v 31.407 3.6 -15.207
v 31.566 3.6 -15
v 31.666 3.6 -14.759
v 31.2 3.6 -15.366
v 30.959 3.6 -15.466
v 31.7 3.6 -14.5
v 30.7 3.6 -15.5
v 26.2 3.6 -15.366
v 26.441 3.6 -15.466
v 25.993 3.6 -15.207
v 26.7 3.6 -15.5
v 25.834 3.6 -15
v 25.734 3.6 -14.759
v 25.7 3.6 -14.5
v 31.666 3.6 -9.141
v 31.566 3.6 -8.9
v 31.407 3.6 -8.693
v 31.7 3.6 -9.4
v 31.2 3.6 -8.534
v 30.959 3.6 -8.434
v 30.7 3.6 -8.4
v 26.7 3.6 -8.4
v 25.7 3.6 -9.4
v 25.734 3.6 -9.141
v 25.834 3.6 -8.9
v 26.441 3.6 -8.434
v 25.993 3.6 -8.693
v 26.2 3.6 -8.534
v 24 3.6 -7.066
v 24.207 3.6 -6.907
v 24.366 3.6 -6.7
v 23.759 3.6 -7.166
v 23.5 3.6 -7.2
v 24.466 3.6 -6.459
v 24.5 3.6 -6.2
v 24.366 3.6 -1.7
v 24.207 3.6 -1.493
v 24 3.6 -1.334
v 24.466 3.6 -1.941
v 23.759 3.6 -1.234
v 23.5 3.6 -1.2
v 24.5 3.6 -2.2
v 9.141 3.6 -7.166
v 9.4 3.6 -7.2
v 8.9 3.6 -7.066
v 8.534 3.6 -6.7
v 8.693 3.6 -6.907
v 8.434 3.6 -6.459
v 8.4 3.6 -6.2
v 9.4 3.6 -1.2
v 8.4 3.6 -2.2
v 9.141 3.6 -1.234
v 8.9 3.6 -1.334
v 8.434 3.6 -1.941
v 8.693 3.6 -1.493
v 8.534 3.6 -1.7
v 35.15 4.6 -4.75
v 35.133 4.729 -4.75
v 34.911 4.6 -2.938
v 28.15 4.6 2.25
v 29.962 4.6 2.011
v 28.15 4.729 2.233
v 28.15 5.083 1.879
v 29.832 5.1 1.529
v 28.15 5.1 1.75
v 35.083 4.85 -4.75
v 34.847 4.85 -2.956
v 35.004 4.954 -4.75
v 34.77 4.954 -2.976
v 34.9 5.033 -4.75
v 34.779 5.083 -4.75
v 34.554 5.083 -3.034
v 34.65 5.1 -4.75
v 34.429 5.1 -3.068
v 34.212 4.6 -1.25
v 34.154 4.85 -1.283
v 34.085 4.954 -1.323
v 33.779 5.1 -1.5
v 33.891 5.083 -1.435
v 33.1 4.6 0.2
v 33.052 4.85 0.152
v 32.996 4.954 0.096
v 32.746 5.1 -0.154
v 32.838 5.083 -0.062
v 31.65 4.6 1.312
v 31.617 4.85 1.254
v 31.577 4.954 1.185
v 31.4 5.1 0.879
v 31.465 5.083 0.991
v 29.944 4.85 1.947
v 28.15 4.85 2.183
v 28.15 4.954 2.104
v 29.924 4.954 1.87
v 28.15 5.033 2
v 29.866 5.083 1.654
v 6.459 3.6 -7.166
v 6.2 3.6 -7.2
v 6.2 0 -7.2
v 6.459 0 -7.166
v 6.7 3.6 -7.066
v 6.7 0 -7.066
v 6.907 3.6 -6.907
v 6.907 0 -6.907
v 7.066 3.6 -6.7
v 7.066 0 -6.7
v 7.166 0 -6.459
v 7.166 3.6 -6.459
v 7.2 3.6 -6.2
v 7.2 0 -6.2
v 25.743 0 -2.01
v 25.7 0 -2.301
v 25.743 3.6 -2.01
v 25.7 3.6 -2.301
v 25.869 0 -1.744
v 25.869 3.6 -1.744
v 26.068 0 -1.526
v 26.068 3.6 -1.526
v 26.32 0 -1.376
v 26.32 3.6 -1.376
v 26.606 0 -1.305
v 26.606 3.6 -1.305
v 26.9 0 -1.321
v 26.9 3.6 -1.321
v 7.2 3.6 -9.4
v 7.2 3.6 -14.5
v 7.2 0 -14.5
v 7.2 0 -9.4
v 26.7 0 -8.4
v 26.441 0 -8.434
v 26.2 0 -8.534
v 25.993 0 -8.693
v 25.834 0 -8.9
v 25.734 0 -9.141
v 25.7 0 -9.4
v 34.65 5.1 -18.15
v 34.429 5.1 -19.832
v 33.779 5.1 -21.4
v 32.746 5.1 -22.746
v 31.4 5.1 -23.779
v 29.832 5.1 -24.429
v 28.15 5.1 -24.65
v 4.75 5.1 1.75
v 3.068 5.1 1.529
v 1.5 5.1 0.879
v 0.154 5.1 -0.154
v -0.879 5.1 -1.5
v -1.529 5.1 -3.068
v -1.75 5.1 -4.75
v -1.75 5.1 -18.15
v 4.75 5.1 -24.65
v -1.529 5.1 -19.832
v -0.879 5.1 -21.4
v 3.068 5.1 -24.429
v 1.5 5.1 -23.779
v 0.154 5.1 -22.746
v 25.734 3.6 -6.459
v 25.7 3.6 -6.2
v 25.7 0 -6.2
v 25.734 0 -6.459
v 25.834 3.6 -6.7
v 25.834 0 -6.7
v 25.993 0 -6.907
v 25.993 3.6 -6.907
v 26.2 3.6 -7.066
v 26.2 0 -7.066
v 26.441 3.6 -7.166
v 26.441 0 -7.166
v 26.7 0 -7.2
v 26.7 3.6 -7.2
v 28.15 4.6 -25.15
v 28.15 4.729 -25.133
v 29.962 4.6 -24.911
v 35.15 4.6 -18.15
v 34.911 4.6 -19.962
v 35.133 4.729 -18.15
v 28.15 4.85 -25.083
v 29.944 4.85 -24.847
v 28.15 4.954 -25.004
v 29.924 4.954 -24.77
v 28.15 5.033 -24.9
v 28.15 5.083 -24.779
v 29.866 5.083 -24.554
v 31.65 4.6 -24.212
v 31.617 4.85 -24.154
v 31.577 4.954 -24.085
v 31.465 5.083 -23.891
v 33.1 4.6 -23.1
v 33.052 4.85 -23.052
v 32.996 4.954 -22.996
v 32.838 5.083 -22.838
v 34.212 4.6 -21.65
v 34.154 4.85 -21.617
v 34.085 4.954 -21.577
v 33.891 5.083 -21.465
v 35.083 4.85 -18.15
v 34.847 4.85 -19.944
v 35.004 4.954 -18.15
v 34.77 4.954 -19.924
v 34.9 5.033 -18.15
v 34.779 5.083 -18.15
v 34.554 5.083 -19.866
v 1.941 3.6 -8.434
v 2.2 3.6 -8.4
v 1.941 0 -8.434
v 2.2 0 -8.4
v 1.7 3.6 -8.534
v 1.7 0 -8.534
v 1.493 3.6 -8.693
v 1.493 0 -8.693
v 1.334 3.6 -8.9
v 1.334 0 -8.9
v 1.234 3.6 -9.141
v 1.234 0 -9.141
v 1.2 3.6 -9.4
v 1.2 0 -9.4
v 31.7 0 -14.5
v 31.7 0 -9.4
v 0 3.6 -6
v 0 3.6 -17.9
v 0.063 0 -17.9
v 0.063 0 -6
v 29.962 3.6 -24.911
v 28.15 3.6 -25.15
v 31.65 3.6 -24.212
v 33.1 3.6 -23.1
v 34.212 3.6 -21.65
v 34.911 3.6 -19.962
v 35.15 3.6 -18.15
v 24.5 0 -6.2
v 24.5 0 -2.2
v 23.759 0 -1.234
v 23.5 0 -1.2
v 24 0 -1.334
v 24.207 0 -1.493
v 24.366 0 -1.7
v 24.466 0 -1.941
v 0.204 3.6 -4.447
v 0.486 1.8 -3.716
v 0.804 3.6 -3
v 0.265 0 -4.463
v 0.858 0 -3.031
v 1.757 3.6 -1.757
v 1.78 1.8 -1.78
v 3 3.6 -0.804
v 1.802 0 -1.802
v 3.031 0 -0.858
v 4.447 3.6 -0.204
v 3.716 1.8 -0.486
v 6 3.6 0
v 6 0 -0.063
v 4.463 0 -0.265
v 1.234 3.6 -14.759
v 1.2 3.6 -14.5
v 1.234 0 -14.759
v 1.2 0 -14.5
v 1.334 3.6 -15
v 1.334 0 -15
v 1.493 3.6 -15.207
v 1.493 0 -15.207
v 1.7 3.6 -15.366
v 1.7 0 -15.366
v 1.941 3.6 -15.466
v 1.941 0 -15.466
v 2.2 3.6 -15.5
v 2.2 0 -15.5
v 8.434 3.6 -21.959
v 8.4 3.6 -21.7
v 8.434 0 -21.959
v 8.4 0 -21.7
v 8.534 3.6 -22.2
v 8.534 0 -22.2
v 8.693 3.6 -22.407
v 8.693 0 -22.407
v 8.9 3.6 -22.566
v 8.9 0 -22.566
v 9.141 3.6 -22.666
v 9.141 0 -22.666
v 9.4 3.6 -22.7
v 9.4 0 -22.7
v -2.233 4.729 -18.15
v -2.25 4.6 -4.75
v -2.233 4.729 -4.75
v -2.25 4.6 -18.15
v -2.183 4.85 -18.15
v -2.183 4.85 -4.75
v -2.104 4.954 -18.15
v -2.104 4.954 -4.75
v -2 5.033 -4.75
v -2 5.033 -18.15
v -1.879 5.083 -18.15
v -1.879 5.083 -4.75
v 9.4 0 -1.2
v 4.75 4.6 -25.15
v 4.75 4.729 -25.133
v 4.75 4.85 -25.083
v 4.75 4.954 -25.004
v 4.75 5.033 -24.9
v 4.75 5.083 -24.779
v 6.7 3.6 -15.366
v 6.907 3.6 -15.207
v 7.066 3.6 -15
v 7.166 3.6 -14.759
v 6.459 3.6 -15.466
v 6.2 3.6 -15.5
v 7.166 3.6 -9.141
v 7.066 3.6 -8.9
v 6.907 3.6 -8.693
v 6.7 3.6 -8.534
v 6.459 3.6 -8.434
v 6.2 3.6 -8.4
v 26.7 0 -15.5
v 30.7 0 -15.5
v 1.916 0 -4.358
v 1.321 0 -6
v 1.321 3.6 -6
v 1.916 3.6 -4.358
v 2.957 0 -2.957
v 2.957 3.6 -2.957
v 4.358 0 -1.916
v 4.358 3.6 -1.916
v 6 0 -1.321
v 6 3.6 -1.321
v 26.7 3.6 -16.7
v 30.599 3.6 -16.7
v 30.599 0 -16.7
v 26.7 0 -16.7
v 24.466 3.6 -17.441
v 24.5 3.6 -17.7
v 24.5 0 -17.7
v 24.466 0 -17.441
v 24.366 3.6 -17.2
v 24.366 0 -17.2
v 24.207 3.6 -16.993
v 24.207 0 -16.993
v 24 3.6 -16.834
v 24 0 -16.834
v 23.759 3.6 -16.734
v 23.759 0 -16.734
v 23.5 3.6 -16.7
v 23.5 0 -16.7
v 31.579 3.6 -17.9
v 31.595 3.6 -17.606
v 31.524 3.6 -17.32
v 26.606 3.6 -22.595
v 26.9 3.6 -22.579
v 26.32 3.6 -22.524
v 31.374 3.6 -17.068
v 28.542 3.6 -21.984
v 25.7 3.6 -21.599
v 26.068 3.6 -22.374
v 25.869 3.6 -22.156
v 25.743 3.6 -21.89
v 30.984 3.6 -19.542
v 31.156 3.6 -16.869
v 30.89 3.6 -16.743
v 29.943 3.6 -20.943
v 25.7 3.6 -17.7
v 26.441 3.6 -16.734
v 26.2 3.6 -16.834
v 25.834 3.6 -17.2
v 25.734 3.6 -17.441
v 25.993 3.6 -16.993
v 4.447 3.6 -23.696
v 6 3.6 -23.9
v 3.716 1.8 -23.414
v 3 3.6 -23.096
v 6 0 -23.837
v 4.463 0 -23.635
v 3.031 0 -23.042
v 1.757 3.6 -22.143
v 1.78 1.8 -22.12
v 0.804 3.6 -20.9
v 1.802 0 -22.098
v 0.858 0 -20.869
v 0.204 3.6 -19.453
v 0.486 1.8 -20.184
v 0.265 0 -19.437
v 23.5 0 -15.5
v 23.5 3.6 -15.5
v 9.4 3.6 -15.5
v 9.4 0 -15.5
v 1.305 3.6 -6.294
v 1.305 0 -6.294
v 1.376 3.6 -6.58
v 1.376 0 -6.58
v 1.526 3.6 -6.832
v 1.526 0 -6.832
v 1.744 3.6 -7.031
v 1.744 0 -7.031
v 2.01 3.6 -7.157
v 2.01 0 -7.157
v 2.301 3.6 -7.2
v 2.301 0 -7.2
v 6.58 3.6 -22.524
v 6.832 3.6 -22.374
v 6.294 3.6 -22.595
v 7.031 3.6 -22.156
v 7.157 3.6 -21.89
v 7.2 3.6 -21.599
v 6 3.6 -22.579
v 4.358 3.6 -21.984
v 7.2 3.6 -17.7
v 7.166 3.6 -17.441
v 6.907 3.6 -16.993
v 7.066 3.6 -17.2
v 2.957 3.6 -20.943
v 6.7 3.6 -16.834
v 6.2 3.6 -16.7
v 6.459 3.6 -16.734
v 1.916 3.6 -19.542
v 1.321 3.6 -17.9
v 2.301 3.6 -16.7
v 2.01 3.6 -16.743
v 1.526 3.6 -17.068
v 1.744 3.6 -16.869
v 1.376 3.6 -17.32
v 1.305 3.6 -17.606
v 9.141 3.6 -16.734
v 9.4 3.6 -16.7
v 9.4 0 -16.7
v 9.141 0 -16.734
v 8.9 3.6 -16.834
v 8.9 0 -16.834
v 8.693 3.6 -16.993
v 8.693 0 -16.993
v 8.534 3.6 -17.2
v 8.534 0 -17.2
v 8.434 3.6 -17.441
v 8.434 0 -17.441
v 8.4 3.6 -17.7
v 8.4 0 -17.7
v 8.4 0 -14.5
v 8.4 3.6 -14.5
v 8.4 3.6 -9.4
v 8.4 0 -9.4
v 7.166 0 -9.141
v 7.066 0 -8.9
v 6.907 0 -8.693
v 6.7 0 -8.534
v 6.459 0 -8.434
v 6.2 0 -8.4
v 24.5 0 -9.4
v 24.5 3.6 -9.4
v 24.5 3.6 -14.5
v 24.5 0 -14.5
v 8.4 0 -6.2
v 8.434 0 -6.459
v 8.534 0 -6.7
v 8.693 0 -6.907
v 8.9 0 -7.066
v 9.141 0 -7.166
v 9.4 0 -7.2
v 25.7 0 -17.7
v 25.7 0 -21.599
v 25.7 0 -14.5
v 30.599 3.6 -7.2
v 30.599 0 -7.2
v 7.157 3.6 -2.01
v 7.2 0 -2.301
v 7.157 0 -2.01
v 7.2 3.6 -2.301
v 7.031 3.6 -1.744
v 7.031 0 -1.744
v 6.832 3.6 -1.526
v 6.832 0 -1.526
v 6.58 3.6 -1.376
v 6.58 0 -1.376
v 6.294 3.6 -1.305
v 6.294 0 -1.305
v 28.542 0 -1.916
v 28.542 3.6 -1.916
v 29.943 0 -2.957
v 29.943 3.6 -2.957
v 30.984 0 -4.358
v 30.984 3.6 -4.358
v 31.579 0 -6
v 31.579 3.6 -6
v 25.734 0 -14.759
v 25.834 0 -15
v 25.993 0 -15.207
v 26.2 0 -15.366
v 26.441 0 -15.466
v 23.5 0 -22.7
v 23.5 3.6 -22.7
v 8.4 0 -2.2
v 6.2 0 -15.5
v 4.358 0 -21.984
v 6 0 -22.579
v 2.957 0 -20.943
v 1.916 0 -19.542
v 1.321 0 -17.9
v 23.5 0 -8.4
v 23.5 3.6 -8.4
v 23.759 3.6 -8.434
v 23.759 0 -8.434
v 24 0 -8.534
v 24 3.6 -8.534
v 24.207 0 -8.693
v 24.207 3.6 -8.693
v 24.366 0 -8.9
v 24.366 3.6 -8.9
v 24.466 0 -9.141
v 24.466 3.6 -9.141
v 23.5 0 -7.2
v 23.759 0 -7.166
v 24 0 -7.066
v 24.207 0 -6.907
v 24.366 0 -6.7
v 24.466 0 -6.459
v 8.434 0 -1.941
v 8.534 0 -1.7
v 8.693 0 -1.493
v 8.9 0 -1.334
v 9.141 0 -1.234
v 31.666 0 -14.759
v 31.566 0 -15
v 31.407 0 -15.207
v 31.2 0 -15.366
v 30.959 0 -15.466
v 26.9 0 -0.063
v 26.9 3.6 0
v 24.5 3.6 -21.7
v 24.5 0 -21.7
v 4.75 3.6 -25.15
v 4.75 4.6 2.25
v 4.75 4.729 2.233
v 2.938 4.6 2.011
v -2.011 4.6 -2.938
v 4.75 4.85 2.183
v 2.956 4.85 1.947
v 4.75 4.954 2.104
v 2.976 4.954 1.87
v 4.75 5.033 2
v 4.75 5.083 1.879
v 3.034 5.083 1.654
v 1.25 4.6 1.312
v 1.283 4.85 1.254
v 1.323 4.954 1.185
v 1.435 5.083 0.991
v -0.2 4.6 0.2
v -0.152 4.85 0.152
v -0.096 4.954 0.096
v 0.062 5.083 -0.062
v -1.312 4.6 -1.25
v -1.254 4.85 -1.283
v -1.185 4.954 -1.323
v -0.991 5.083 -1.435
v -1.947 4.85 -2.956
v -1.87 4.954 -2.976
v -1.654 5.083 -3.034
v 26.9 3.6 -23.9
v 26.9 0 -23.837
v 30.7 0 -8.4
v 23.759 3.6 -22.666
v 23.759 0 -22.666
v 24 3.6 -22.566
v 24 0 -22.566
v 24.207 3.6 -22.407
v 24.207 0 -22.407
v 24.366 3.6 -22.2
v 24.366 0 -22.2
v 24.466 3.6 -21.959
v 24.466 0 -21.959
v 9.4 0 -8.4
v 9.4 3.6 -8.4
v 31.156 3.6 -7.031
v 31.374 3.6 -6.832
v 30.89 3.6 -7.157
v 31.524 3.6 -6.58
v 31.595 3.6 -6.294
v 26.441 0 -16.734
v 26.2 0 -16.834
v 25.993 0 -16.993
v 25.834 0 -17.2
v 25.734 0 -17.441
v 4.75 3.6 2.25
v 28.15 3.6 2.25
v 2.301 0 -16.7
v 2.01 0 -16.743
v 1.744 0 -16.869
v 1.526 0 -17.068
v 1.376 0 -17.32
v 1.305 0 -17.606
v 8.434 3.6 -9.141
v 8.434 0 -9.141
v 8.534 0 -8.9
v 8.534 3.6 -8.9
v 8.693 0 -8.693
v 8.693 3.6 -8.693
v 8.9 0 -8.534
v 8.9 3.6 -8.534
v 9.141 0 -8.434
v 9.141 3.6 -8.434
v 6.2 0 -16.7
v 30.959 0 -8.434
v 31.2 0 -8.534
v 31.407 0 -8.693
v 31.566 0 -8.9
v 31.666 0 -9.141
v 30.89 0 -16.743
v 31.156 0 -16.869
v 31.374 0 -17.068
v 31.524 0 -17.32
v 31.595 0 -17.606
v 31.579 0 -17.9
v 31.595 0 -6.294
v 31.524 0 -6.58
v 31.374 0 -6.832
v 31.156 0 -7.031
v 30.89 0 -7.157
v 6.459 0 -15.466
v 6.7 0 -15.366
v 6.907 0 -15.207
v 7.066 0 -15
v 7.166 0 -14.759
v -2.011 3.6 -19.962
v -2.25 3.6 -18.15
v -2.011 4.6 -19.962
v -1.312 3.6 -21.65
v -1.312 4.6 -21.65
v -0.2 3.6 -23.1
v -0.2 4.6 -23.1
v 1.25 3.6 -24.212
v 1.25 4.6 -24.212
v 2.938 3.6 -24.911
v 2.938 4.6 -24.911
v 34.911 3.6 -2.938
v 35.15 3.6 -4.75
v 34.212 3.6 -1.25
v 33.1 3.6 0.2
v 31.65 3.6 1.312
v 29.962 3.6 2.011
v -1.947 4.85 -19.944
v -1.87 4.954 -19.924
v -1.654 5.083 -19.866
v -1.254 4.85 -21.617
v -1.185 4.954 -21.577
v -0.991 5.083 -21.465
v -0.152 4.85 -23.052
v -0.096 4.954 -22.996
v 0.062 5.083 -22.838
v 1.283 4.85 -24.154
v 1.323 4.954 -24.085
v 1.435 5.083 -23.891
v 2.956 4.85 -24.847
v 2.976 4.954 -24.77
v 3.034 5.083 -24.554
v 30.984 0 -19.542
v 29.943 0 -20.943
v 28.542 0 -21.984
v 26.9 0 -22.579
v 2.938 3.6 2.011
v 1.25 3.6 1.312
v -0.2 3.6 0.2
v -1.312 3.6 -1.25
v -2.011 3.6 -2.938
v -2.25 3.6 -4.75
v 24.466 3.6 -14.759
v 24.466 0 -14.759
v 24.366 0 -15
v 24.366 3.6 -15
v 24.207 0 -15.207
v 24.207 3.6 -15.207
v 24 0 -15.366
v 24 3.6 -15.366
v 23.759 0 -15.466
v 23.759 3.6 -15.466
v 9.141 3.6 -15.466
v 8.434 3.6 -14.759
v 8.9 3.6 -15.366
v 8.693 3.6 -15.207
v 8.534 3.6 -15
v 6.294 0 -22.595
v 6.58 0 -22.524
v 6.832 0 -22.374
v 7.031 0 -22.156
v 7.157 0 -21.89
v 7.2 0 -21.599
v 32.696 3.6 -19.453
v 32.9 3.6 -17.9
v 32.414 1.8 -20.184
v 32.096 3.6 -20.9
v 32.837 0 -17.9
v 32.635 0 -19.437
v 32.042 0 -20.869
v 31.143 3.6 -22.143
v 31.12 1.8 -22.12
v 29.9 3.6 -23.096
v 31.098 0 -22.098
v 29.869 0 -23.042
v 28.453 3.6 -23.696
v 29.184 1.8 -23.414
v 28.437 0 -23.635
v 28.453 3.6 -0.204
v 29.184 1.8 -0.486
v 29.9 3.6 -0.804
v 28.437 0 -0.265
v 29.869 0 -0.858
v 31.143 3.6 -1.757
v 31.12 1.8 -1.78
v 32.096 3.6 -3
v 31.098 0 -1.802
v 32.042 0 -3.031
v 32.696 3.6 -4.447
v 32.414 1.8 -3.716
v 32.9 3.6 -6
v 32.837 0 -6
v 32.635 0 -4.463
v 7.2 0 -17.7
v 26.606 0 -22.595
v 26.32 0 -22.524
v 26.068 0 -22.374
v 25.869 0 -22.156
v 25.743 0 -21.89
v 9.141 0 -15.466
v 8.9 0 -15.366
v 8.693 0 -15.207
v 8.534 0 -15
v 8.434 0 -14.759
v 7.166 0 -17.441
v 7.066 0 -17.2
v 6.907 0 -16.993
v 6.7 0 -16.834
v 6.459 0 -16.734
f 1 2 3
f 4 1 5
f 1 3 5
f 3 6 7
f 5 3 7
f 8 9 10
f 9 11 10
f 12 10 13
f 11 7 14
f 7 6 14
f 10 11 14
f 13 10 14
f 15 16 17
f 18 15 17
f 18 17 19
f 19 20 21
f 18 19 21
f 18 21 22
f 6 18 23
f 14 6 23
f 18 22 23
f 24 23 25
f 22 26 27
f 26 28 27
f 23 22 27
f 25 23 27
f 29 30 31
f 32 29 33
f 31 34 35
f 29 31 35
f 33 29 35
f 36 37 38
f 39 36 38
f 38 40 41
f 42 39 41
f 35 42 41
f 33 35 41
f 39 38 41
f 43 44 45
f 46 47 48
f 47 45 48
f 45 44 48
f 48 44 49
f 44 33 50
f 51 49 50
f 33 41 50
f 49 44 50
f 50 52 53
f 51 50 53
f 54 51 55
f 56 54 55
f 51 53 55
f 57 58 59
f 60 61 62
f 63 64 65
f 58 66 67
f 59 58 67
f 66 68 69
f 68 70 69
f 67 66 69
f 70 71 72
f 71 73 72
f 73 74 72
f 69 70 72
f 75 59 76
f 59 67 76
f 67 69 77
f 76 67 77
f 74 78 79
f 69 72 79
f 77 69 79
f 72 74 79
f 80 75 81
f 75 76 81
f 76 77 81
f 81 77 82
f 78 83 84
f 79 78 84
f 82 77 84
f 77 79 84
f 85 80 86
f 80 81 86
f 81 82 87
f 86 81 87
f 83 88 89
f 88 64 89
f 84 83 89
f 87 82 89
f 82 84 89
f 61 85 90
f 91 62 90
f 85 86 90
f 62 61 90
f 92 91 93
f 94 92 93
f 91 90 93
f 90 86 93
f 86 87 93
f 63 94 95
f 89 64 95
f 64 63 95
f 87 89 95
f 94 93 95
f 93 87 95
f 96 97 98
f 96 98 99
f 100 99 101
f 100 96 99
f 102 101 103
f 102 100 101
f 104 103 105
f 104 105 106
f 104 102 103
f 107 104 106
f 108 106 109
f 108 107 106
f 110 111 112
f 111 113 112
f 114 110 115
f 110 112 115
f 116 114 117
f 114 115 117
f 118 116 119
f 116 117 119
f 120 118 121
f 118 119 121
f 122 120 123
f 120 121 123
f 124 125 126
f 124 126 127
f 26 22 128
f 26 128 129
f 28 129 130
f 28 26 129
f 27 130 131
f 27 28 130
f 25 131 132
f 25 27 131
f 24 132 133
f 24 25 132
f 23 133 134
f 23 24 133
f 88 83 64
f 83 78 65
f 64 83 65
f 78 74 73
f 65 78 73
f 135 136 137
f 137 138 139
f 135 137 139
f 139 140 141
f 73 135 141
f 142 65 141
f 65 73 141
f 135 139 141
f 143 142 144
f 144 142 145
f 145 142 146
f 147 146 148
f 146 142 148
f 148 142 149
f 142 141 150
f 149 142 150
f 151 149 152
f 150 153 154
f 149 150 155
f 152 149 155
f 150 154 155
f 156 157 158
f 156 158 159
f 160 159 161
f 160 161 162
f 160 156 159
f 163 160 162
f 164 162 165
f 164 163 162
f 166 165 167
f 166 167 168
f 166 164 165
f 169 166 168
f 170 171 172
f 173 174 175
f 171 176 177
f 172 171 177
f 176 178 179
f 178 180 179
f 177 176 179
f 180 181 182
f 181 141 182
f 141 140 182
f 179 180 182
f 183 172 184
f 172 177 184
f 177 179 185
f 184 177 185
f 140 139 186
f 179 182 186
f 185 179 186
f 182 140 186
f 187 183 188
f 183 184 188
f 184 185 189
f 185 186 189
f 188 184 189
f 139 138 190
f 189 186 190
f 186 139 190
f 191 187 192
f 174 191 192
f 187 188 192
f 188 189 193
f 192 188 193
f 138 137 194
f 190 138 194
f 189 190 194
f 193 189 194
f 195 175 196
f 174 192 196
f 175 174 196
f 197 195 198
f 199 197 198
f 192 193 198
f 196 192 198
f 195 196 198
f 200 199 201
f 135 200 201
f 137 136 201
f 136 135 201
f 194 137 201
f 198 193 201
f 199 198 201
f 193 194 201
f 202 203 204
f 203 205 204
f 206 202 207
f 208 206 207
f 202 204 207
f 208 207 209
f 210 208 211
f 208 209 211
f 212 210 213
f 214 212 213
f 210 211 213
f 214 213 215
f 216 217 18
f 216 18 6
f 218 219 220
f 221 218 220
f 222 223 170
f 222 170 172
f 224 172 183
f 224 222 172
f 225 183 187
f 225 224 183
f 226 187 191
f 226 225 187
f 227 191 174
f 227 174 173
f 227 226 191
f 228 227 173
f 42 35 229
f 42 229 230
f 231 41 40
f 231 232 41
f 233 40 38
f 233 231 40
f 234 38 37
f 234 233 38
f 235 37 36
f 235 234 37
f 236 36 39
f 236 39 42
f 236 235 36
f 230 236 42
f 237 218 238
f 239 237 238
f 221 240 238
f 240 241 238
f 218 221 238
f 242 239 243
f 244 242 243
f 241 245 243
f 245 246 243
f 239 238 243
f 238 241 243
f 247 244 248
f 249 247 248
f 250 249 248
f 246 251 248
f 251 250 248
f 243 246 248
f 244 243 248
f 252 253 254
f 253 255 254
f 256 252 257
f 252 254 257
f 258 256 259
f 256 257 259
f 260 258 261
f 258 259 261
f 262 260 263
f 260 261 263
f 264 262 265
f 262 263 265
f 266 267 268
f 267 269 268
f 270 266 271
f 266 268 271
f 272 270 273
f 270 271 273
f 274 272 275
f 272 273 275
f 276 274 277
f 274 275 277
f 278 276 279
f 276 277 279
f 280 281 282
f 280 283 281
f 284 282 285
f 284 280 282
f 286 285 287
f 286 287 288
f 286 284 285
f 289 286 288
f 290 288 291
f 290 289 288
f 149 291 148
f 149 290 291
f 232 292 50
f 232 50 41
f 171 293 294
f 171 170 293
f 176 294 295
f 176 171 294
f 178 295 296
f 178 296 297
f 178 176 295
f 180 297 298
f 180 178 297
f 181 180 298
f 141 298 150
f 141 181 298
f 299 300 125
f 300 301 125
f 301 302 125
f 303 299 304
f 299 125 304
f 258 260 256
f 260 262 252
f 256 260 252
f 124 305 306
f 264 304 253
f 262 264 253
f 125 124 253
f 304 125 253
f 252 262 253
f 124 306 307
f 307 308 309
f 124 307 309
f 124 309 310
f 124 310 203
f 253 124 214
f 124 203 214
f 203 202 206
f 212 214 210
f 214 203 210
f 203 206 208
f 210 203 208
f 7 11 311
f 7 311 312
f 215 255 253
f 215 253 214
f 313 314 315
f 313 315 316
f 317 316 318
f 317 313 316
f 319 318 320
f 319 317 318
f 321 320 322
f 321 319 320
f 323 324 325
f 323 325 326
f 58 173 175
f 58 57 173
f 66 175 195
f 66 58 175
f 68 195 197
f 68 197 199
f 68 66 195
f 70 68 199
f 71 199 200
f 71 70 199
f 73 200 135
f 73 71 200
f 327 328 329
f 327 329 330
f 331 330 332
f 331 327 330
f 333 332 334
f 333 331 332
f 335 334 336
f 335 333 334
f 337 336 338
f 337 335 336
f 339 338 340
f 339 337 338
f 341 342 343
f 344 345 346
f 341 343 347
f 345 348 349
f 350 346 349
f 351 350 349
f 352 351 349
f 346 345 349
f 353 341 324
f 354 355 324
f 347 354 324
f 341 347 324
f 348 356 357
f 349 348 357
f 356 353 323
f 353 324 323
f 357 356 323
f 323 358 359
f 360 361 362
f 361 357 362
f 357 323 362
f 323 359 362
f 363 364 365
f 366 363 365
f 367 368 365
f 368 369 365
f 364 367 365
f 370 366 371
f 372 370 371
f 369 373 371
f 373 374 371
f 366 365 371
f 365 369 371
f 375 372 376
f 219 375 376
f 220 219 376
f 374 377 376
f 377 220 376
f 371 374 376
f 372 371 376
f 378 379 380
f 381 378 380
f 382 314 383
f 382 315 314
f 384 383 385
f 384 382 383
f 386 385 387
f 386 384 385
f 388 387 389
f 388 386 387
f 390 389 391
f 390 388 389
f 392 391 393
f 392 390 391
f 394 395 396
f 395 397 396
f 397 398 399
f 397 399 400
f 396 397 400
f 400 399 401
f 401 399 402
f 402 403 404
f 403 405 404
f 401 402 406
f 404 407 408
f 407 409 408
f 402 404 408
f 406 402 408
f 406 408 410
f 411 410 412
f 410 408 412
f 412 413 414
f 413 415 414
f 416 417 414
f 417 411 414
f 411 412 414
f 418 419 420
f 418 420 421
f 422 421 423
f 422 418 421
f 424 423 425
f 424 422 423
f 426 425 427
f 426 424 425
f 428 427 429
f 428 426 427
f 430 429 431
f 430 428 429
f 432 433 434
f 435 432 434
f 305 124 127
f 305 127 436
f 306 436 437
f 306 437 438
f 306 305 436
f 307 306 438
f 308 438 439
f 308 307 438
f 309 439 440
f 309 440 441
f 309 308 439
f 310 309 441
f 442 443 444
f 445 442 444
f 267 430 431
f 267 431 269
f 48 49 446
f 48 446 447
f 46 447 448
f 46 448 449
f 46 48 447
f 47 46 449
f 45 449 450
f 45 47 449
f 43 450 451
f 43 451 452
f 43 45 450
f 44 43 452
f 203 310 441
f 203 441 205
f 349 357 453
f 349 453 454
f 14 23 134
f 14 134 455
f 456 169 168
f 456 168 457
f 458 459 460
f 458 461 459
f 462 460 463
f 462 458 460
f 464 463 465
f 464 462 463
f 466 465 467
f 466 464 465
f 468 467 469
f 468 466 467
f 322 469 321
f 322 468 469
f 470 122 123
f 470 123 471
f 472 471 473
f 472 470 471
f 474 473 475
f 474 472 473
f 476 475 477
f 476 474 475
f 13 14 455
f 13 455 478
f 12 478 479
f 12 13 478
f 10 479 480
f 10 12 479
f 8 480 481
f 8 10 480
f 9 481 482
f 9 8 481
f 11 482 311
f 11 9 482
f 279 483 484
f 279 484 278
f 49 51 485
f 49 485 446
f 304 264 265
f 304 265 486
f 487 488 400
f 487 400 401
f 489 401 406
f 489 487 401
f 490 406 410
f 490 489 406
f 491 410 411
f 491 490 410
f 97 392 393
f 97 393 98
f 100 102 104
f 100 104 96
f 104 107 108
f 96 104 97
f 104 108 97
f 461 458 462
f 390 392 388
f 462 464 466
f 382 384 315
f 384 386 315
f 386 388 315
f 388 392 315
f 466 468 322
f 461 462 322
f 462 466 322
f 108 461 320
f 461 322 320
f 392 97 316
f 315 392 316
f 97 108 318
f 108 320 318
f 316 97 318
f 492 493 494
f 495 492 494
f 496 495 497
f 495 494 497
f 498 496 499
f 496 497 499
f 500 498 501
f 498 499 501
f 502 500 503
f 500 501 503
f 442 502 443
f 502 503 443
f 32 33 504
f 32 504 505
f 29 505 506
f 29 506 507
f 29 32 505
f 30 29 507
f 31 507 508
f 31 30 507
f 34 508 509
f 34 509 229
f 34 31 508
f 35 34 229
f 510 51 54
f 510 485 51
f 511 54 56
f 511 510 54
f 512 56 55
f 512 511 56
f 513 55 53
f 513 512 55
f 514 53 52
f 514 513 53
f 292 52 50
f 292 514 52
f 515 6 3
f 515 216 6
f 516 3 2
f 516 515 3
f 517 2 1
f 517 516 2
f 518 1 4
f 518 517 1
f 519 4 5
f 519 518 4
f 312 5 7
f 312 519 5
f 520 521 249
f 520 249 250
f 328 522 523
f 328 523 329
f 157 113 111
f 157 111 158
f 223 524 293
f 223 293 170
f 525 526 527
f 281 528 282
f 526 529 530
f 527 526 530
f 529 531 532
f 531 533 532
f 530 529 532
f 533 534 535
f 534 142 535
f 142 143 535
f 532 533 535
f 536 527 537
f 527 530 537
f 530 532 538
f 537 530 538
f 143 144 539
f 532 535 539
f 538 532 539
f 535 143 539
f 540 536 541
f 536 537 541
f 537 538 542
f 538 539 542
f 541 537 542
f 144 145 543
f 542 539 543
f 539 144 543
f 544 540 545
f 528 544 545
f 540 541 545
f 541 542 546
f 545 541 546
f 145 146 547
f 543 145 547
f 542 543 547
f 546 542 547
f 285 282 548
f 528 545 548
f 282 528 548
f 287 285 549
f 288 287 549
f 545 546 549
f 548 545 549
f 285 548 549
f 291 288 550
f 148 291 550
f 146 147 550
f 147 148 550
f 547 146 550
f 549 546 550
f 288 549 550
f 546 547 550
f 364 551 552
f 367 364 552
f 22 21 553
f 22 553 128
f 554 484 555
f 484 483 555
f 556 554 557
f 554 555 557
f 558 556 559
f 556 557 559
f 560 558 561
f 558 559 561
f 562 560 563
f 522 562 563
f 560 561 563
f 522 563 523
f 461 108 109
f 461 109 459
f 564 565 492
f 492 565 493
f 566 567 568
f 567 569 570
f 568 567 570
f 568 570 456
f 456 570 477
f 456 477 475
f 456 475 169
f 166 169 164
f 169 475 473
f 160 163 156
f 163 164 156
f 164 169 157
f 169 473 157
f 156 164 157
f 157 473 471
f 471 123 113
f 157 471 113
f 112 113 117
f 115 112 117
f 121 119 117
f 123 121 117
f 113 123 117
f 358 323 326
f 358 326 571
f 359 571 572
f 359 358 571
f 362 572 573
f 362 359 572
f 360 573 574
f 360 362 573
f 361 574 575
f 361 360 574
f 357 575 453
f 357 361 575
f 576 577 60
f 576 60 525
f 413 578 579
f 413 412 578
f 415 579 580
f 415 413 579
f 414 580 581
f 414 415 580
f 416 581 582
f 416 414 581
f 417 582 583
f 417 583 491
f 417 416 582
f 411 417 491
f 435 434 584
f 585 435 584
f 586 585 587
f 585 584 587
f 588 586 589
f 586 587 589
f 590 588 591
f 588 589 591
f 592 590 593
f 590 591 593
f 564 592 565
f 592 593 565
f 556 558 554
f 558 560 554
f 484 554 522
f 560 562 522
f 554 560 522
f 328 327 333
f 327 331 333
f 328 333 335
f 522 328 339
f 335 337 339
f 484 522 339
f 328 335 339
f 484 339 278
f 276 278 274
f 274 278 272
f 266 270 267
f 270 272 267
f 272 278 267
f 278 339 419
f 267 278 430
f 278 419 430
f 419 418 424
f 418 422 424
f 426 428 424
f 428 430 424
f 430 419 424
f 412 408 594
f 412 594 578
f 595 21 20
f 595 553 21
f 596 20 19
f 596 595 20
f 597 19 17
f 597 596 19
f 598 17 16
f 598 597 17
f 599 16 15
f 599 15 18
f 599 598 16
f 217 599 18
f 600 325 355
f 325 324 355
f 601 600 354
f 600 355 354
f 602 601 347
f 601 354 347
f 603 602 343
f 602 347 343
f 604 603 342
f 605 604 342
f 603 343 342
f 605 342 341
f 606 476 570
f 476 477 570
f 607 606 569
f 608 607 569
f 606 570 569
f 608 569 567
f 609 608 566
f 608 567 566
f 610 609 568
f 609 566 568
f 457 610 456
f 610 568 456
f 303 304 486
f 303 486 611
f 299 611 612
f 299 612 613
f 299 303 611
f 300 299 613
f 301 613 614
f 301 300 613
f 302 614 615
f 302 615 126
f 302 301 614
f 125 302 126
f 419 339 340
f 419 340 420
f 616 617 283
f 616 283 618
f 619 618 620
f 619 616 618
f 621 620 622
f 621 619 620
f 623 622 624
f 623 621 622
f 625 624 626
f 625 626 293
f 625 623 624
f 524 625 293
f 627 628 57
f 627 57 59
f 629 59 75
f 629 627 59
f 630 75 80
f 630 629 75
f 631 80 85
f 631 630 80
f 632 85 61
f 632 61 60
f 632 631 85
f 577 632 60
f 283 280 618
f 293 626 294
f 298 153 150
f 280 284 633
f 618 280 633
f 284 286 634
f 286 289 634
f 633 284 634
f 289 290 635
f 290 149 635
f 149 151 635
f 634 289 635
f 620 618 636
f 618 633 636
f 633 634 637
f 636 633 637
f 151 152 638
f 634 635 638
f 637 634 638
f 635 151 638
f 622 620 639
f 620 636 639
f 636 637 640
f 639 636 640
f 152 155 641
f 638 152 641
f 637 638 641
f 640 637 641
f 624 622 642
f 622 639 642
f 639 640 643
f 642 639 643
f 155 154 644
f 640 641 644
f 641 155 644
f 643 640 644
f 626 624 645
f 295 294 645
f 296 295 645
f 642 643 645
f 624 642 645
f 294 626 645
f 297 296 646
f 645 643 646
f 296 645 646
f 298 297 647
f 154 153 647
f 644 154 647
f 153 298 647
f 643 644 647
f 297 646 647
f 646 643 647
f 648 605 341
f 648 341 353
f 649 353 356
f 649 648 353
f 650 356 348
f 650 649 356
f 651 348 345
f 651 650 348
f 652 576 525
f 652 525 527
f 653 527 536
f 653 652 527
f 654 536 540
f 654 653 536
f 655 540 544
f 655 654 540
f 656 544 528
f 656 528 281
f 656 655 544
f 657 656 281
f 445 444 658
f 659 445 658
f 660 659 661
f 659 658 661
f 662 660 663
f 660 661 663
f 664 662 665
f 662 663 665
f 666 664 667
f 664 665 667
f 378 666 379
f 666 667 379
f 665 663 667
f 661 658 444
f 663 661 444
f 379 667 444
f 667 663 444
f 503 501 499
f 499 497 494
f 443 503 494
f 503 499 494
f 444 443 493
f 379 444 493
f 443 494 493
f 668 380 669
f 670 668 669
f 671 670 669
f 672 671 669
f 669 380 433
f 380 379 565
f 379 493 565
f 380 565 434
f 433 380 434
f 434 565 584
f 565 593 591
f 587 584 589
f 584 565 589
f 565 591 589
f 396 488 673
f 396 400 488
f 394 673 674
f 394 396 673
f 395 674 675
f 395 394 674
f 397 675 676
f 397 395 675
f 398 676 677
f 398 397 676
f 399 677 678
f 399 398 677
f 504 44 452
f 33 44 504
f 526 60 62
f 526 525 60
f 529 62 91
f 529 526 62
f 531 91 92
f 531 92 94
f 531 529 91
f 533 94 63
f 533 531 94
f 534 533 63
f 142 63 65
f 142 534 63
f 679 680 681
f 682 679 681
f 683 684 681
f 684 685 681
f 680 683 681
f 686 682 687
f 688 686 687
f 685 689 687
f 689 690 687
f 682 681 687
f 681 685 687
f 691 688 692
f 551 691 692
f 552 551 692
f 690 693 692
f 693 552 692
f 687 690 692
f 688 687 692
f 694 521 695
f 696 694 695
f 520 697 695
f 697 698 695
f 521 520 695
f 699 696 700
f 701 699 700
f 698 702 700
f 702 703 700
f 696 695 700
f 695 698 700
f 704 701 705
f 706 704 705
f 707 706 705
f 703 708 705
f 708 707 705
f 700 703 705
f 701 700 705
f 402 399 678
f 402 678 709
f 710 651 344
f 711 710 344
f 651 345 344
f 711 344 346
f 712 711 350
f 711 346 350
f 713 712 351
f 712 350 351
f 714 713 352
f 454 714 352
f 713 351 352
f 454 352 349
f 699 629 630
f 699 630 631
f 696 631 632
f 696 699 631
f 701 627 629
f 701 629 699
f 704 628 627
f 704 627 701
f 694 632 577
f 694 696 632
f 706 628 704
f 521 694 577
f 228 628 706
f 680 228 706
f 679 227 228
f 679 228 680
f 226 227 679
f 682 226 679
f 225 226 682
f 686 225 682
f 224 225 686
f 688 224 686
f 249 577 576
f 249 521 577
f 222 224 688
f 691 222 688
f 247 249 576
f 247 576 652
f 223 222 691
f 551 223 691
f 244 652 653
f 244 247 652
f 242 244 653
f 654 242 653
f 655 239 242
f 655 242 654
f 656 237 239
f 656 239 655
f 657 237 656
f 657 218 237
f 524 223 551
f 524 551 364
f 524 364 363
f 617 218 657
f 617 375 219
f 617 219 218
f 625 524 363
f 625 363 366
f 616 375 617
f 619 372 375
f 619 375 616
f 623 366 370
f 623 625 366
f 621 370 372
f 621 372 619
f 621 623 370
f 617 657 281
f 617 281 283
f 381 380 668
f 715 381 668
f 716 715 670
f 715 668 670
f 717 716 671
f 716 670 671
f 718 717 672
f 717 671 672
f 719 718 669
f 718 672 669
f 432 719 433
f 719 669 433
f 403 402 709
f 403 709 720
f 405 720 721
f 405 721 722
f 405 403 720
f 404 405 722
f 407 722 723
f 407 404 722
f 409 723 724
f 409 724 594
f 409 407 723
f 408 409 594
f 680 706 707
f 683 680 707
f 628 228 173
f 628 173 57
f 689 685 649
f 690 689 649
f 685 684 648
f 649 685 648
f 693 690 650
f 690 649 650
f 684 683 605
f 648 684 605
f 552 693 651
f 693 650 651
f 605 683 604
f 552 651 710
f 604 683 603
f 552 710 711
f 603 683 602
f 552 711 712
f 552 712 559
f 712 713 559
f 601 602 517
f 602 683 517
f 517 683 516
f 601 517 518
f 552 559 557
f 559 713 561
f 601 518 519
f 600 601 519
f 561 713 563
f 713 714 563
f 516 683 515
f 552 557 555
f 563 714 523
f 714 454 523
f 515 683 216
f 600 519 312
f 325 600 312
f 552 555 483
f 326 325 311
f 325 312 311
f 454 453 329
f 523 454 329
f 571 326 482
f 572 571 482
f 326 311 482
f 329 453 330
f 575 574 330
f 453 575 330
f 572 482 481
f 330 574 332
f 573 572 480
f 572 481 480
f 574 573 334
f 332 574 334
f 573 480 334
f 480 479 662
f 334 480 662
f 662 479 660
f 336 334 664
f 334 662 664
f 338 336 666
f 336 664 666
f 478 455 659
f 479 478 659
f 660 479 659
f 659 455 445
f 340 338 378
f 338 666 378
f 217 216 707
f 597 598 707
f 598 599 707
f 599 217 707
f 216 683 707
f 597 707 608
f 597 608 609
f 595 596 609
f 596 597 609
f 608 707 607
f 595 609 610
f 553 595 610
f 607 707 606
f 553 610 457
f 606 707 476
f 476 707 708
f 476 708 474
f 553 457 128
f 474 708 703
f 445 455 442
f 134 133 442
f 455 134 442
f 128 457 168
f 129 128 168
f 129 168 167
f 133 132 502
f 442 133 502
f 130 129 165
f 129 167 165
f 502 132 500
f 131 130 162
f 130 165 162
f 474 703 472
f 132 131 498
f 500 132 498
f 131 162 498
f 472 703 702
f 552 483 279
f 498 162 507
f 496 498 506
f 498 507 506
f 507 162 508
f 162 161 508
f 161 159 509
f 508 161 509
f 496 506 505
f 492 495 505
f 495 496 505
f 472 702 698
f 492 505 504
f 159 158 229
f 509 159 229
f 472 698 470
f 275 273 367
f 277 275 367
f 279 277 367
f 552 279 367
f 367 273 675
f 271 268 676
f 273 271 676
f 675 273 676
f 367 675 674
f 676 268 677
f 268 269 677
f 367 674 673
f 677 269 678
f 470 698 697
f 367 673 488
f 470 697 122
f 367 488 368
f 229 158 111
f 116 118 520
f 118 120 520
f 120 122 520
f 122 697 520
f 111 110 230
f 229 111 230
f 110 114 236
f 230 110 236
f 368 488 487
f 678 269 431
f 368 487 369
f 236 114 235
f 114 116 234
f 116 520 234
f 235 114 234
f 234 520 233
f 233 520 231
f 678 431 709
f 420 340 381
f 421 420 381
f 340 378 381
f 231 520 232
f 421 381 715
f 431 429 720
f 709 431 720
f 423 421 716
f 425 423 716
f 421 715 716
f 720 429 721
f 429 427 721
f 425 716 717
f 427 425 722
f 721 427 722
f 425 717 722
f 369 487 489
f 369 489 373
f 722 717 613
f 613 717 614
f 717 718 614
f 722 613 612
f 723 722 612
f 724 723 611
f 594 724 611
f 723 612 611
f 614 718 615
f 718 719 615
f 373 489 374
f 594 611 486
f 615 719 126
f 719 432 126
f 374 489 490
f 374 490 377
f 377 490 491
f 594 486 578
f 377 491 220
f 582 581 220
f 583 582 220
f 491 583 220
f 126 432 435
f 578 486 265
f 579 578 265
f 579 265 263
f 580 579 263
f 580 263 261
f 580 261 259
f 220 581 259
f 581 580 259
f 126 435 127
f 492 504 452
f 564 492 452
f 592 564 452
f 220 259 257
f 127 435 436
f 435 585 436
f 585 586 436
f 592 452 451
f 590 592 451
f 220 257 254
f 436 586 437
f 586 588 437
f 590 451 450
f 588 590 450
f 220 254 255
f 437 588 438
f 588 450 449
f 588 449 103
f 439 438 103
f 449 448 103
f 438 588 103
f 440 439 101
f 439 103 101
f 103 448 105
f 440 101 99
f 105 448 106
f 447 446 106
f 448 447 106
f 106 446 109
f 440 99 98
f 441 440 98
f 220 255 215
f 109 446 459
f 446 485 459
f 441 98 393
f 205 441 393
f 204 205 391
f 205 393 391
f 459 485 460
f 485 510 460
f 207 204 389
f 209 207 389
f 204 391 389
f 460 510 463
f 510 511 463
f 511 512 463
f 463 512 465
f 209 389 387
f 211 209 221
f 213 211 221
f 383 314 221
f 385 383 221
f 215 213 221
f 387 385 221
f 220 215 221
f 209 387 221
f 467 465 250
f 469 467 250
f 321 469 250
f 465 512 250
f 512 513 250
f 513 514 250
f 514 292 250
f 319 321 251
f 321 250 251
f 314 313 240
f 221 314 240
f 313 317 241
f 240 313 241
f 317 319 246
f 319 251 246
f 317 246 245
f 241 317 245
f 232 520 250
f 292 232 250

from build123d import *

# Parameters (mm, degrees)
BOSS_EXTRUDE1_DEPTH = 3.6
BOSS_EXTRUDE2_DEPTH = 1.5
CUT_EXTRUDE1_DEPTH  = 3.6
BOSS_EXTRUDE5_DEPTH = 3.6
CHAMFER1_SIZE       = 3.6
CHAMFER1_SIZE_2     = 0.062838234
FILLET3_R           = 1
FILLET4_R           = 0.5


with BuildPart() as part:
    # Sketch1 → Boss-Extrude1 (new body)
    with BuildSketch(Plane(origin=(0, 0, 0), x_dir=(1, 0, 0), z_dir=(0, 1, 0))):
        with BuildLine():
            Line((6, 0), (26.9, 0))
            ThreePointArc((26.9, 0), (31.142640687, 1.757359313), (32.9, 6))
            Line((32.9, 6), (32.9, 17.9))
            ThreePointArc((32.9, 17.9), (31.142640687, 22.142640687), (26.9, 23.9))
            Line((26.9, 23.9), (6, 23.9))
            ThreePointArc((6, 23.9), (1.757359313, 22.142640687), (0, 17.9))
            Line((0, 17.9), (0, 6))
            ThreePointArc((0, 6), (1.757359313, 1.757359313), (6, 0))
        make_face()
    extrude(amount=BOSS_EXTRUDE1_DEPTH)

    # Sketch2 → Boss-Extrude2 (add)
    with BuildSketch(Plane(origin=(0, 3.6, 0), x_dir=(1, 0, 0), z_dir=(0, 1, 0))):
        with BuildLine():
            Line((4.75, 25.15), (28.15, 25.15))
            ThreePointArc((28.15, 25.15), (33.099747468, 23.099747468), (35.15, 18.15))
            Line((35.15, 18.15), (35.15, 4.75))
            ThreePointArc((35.15, 4.75), (33.099747468, -0.199747468), (28.15, -2.25))
            Line((28.15, -2.25), (4.75, -2.25))
            ThreePointArc((4.75, -2.25), (-0.199747468, -0.199747468), (-2.25, 4.75))
            Line((-2.25, 4.75), (-2.25, 18.15))
            ThreePointArc((-2.25, 18.15), (-0.199747468, 23.099747468), (4.75, 25.15))
        make_face()
    extrude(amount=BOSS_EXTRUDE2_DEPTH)

    # Sketch3 → Cut-Extrude1 (cut)
    with BuildSketch(Plane.XZ):
        with BuildLine():
            Line((25.7, -22.7), (7.2, -22.7))
            ThreePointArc((7.2, -22.7), (2.957359313, -20.942640687), (1.2, -16.7))
            Line((1.2, -16.7), (1.2, -7.2))
            ThreePointArc((1.2, -7.2), (2.957359313, -2.957359313), (7.2, -1.2))
            Line((7.2, -1.2), (25.7, -1.2))
            ThreePointArc((25.7, -1.2), (29.942640687, -2.957359313), (31.7, -7.2))
            Line((31.7, -7.2), (31.7, -16.7))
            ThreePointArc((31.7, -16.7), (29.942640687, -20.942640687), (25.7, -22.7))
        make_face()
    extrude(amount=-CUT_EXTRUDE1_DEPTH, mode=Mode.SUBTRACT)

    # Sketch5 → Boss-Extrude5 (add)
    with BuildSketch(Plane.XZ.offset(-3.6)):
        with BuildLine():
            Line((7.2, -1.2), (8.4, -1.2))
            Line((8.4, -1.2), (8.4, -6.2))
            ThreePointArc((8.4, -6.2), (8.692893219, -6.907106781), (9.4, -7.2))
            Line((9.4, -7.2), (23.5, -7.2))
            ThreePointArc((23.5, -7.2), (24.207106781, -6.907106781), (24.5, -6.2))
            Line((24.5, -6.2), (24.5, -1.2))
            Line((24.5, -1.2), (25.7, -1.2))
            Line((25.7, -1.2), (25.7, -6.2))
            ThreePointArc((25.7, -6.2), (25.992893219, -6.907106781), (26.7, -7.2))
            Line((26.7, -7.2), (31.7, -7.2))
            Line((31.7, -7.2), (31.7, -8.4))
            Line((31.7, -8.4), (26.7, -8.4))
            ThreePointArc((26.7, -8.4), (25.992893219, -8.692893219), (25.7, -9.4))
            Line((25.7, -9.4), (25.7, -14.5))
            ThreePointArc((25.7, -14.5), (25.992893219, -15.207106781), (26.7, -15.5))
            Line((26.7, -15.5), (31.7, -15.5))
            Line((31.7, -15.5), (31.7, -16.7))
            Line((31.7, -16.7), (26.7, -16.7))
            ThreePointArc((26.7, -16.7), (25.992893219, -16.992893219), (25.7, -17.7))
            Line((25.7, -17.7), (25.7, -22.7))
            Line((25.7, -22.7), (24.5, -22.7))
            Line((24.5, -22.7), (24.5, -17.7))
            ThreePointArc((24.5, -17.7), (24.207106781, -16.992893219), (23.5, -16.7))
            Line((23.5, -16.7), (9.4, -16.7))
            ThreePointArc((9.4, -16.7), (8.692893219, -16.992893219), (8.4, -17.7))
            Line((8.4, -17.7), (8.4, -22.7))
            Line((8.4, -22.7), (7.2, -22.7))
            Line((7.2, -22.7), (7.2, -17.7))
            ThreePointArc((7.2, -17.7), (6.907106781, -16.992893219), (6.2, -16.7))
            Line((6.2, -16.7), (1.2, -16.7))
            Line((1.2, -16.7), (1.2, -15.5))
            Line((1.2, -15.5), (6.2, -15.5))
            ThreePointArc((6.2, -15.5), (6.907106781, -15.207106781), (7.2, -14.5))
            Line((7.2, -14.5), (7.2, -9.4))
            ThreePointArc((7.2, -9.4), (6.907106781, -8.692893219), (6.2, -8.4))
            Line((6.2, -8.4), (1.2, -8.4))
            Line((1.2, -8.4), (1.2, -7.2))
            Line((1.2, -7.2), (6.2, -7.2))
            ThreePointArc((6.2, -7.2), (6.907106781, -6.907106781), (7.2, -6.2))
            Line((7.2, -6.2), (7.2, -1.2))
        make_face()
        with BuildLine():
            Line((9.4, -8.4), (23.5, -8.4))
            ThreePointArc((23.5, -8.4), (24.207106781, -8.692893219), (24.5, -9.4))
            Line((24.5, -9.4), (24.5, -14.5))
            ThreePointArc((24.5, -14.5), (24.207106781, -15.207106781), (23.5, -15.5))
            Line((23.5, -15.5), (9.4, -15.5))
            ThreePointArc((9.4, -15.5), (8.692893219, -15.207106781), (8.4, -14.5))
            Line((8.4, -14.5), (8.4, -9.4))
            ThreePointArc((8.4, -9.4), (8.692893219, -8.692893219), (9.4, -8.4))
        make_face(mode=Mode.SUBTRACT)
    extrude(amount=BOSS_EXTRUDE5_DEPTH)

    # Chamfer1
    # the kernel refuses this chamfer: 3.6, 0.062838234 mm, written as the material it takes off along each edge
    with BuildSketch(Plane(origin=(0, 0, -17.9), x_dir=(-0.0006712501823120534, 0.9999997747115711, 0), z_dir=(0, 0, 1))) as chamfer1_piece_1_section:
        Polygon((CHAMFER1_SIZE * 0.999999774712, -CHAMFER1_SIZE * 0.000671250182312), (-CHAMFER1_SIZE_2 * 0.000671250179552, -CHAMFER1_SIZE_2 * 0.999999770599), (0, 0), align=None)
    chamfer1_piece_1 = extrude(amount=11.9, mode=Mode.PRIVATE)
    chamfer1_piece_1 = split(chamfer1_piece_1, bisect_by=Plane(origin=(-0.01902042, 3.6, -11.95), z_dir=(0, -1, 0)), keep=Keep.TOP, mode=Mode.PRIVATE)
    add(chamfer1_piece_1, mode=Mode.SUBTRACT)
    with BuildSketch(Plane(origin=(6, 0, -6), x_dir=(-1, 0, 0), z_dir=(0, 0, -1))) as chamfer1_piece_2_section:
        Polygon((6, CHAMFER1_SIZE), (6 - CHAMFER1_SIZE_2 * 0.999999995888, 0), (6, 0), align=None)
    chamfer1_piece_2 = revolve(axis=Axis((6, 0, -6), (0, 1, 0)), revolution_arc=90, mode=Mode.PRIVATE)
    chamfer1_piece_2 = split(chamfer1_piece_2, bisect_by=Plane(origin=(1.769655981, 3.6, -1.769655981), z_dir=(0, -1, 0)), keep=Keep.TOP, mode=Mode.PRIVATE)
    add(chamfer1_piece_2, mode=Mode.SUBTRACT)
    with BuildSketch(Plane(origin=(6, 0, -17.9), x_dir=(0, 0, -1), z_dir=(1, 0, 0))) as chamfer1_piece_3_section:
        Polygon((6, CHAMFER1_SIZE), (6 - CHAMFER1_SIZE_2 * 0.999999995888, 0), (6, 0), align=None)
    chamfer1_piece_3 = revolve(axis=Axis((6, 0, -17.9), (0, 1, 0)), revolution_arc=90, mode=Mode.PRIVATE)
    chamfer1_piece_3 = split(chamfer1_piece_3, bisect_by=Plane(origin=(1.769655981, 3.6, -22.130344019), z_dir=(0, -1, 0)), keep=Keep.TOP, mode=Mode.PRIVATE)
    add(chamfer1_piece_3, mode=Mode.SUBTRACT)
    with BuildSketch(Plane(origin=(6, 0, 0), x_dir=(0, 0.9999997747115711, 0.0006712501823120534), z_dir=(1, 0, 0))) as chamfer1_piece_4_section:
        Polygon((CHAMFER1_SIZE * 0.999999774712, -CHAMFER1_SIZE * 0.000671250182312), (-CHAMFER1_SIZE_2 * 0.000671250179552, -CHAMFER1_SIZE_2 * 0.999999770599), (0, 0), align=None)
    chamfer1_piece_4 = extrude(amount=20.9, mode=Mode.PRIVATE)
    chamfer1_piece_4 = split(chamfer1_piece_4, bisect_by=Plane(origin=(16.45, 3.6, 0.01902042), z_dir=(0, -1, 0)), keep=Keep.TOP, mode=Mode.PRIVATE)
    add(chamfer1_piece_4, mode=Mode.SUBTRACT)
    with BuildSketch(Plane(origin=(26.9, 0, -23.9), x_dir=(0, 0.9999997747115711, -0.0006712501823119971), z_dir=(-1, 0, 0))) as chamfer1_piece_5_section:
        Polygon((CHAMFER1_SIZE * 0.999999774712, -CHAMFER1_SIZE * 0.000671250182312), (-CHAMFER1_SIZE_2 * 0.000671250179552, -CHAMFER1_SIZE_2 * 0.999999770599), (0, 0), align=None)
    chamfer1_piece_5 = extrude(amount=20.9, mode=Mode.PRIVATE)
    chamfer1_piece_5 = split(chamfer1_piece_5, bisect_by=Plane(origin=(16.45, 3.6, -23.91902042), z_dir=(0, -1, 0)), keep=Keep.TOP, mode=Mode.PRIVATE)
    add(chamfer1_piece_5, mode=Mode.SUBTRACT)
    with BuildSketch(Plane(origin=(26.9, 0, -6), x_dir=(0, 0, 1), z_dir=(-1, 0, 0))) as chamfer1_piece_6_section:
        Polygon((6, CHAMFER1_SIZE), (6 - CHAMFER1_SIZE_2 * 0.999999995888, 0), (6, 0), align=None)
    chamfer1_piece_6 = revolve(axis=Axis((26.9, 0, -6), (0, 1, 0)), revolution_arc=90, mode=Mode.PRIVATE)
    chamfer1_piece_6 = split(chamfer1_piece_6, bisect_by=Plane(origin=(31.130344019, 3.6, -1.769655981), z_dir=(0, -1, 0)), keep=Keep.TOP, mode=Mode.PRIVATE)
    add(chamfer1_piece_6, mode=Mode.SUBTRACT)
    with BuildSketch(Plane(origin=(26.9, 0, -17.9), x_dir=(1, 0, 0), z_dir=(0, 0, 1))) as chamfer1_piece_7_section:
        Polygon((6, CHAMFER1_SIZE), (6 - CHAMFER1_SIZE_2 * 0.999999995888, 0), (6, 0), align=None)
    chamfer1_piece_7 = revolve(axis=Axis((26.9, 0, -17.9), (0, 1, 0)), revolution_arc=90, mode=Mode.PRIVATE)
    chamfer1_piece_7 = split(chamfer1_piece_7, bisect_by=Plane(origin=(31.130344019, 3.6, -22.130344019), z_dir=(0, -1, 0)), keep=Keep.TOP, mode=Mode.PRIVATE)
    add(chamfer1_piece_7, mode=Mode.SUBTRACT)
    with BuildSketch(Plane(origin=(32.9, 0, -6), x_dir=(0.000671250182312946, 0.9999997747115711, 0), z_dir=(0, 0, -1))) as chamfer1_piece_8_section:
        Polygon((CHAMFER1_SIZE * 0.999999774712, -CHAMFER1_SIZE * 0.000671250182313), (-CHAMFER1_SIZE_2 * 0.000671250179553, -CHAMFER1_SIZE_2 * 0.999999770599), (0, 0), align=None)
    chamfer1_piece_8 = extrude(amount=11.9, mode=Mode.PRIVATE)
    chamfer1_piece_8 = split(chamfer1_piece_8, bisect_by=Plane(origin=(32.91902042, 3.6, -11.95), z_dir=(0, -1, 0)), keep=Keep.TOP, mode=Mode.PRIVATE)
    add(chamfer1_piece_8, mode=Mode.SUBTRACT)

    # Fillet3
    fillet3_edges = [part.edges().sort_by_distance(p)[0] for p in [
        (1.2, 1.8, -8.4),
        (1.2, 1.8, -15.5),
        (8.4, 1.8, -22.7),
        (24.5, 1.8, -22.7),
        (31.7, 1.8, -15.5),
        (31.7, 1.8, -8.4),
        (24.5, 1.8, -1.2),
        (8.4, 1.8, -1.2),
        (7.2, 1.8, -22.7),
        (1.2, 1.8, -16.7),
        (1.2, 1.8, -7.2),
        (7.2, 1.8, -1.2),
        (25.7, 1.8, -1.2),
        (31.7, 1.8, -7.2),
        (31.7, 1.8, -16.7),
        (25.7, 1.8, -22.7),
    ]]
    fillet(fillet3_edges, radius=FILLET3_R)

    # Fillet4
    fillet4_edges = [part.edges().sort_by_distance(p)[0] for p in [
        (-0.199747468, 5.1, 0.199747468),
        (16.45, 5.1, 2.25),
        (33.099747468, 5.1, 0.199747468),
        (35.15, 5.1, -11.45),
        (33.099747468, 5.1, -23.099747468),
        (16.45, 5.1, -25.15),
        (-0.199747468, 5.1, -23.099747468),
        (-2.25, 5.1, -11.45),
    ]]
    fillet(fillet4_edges, radius=FILLET4_R)


solid = part.part
